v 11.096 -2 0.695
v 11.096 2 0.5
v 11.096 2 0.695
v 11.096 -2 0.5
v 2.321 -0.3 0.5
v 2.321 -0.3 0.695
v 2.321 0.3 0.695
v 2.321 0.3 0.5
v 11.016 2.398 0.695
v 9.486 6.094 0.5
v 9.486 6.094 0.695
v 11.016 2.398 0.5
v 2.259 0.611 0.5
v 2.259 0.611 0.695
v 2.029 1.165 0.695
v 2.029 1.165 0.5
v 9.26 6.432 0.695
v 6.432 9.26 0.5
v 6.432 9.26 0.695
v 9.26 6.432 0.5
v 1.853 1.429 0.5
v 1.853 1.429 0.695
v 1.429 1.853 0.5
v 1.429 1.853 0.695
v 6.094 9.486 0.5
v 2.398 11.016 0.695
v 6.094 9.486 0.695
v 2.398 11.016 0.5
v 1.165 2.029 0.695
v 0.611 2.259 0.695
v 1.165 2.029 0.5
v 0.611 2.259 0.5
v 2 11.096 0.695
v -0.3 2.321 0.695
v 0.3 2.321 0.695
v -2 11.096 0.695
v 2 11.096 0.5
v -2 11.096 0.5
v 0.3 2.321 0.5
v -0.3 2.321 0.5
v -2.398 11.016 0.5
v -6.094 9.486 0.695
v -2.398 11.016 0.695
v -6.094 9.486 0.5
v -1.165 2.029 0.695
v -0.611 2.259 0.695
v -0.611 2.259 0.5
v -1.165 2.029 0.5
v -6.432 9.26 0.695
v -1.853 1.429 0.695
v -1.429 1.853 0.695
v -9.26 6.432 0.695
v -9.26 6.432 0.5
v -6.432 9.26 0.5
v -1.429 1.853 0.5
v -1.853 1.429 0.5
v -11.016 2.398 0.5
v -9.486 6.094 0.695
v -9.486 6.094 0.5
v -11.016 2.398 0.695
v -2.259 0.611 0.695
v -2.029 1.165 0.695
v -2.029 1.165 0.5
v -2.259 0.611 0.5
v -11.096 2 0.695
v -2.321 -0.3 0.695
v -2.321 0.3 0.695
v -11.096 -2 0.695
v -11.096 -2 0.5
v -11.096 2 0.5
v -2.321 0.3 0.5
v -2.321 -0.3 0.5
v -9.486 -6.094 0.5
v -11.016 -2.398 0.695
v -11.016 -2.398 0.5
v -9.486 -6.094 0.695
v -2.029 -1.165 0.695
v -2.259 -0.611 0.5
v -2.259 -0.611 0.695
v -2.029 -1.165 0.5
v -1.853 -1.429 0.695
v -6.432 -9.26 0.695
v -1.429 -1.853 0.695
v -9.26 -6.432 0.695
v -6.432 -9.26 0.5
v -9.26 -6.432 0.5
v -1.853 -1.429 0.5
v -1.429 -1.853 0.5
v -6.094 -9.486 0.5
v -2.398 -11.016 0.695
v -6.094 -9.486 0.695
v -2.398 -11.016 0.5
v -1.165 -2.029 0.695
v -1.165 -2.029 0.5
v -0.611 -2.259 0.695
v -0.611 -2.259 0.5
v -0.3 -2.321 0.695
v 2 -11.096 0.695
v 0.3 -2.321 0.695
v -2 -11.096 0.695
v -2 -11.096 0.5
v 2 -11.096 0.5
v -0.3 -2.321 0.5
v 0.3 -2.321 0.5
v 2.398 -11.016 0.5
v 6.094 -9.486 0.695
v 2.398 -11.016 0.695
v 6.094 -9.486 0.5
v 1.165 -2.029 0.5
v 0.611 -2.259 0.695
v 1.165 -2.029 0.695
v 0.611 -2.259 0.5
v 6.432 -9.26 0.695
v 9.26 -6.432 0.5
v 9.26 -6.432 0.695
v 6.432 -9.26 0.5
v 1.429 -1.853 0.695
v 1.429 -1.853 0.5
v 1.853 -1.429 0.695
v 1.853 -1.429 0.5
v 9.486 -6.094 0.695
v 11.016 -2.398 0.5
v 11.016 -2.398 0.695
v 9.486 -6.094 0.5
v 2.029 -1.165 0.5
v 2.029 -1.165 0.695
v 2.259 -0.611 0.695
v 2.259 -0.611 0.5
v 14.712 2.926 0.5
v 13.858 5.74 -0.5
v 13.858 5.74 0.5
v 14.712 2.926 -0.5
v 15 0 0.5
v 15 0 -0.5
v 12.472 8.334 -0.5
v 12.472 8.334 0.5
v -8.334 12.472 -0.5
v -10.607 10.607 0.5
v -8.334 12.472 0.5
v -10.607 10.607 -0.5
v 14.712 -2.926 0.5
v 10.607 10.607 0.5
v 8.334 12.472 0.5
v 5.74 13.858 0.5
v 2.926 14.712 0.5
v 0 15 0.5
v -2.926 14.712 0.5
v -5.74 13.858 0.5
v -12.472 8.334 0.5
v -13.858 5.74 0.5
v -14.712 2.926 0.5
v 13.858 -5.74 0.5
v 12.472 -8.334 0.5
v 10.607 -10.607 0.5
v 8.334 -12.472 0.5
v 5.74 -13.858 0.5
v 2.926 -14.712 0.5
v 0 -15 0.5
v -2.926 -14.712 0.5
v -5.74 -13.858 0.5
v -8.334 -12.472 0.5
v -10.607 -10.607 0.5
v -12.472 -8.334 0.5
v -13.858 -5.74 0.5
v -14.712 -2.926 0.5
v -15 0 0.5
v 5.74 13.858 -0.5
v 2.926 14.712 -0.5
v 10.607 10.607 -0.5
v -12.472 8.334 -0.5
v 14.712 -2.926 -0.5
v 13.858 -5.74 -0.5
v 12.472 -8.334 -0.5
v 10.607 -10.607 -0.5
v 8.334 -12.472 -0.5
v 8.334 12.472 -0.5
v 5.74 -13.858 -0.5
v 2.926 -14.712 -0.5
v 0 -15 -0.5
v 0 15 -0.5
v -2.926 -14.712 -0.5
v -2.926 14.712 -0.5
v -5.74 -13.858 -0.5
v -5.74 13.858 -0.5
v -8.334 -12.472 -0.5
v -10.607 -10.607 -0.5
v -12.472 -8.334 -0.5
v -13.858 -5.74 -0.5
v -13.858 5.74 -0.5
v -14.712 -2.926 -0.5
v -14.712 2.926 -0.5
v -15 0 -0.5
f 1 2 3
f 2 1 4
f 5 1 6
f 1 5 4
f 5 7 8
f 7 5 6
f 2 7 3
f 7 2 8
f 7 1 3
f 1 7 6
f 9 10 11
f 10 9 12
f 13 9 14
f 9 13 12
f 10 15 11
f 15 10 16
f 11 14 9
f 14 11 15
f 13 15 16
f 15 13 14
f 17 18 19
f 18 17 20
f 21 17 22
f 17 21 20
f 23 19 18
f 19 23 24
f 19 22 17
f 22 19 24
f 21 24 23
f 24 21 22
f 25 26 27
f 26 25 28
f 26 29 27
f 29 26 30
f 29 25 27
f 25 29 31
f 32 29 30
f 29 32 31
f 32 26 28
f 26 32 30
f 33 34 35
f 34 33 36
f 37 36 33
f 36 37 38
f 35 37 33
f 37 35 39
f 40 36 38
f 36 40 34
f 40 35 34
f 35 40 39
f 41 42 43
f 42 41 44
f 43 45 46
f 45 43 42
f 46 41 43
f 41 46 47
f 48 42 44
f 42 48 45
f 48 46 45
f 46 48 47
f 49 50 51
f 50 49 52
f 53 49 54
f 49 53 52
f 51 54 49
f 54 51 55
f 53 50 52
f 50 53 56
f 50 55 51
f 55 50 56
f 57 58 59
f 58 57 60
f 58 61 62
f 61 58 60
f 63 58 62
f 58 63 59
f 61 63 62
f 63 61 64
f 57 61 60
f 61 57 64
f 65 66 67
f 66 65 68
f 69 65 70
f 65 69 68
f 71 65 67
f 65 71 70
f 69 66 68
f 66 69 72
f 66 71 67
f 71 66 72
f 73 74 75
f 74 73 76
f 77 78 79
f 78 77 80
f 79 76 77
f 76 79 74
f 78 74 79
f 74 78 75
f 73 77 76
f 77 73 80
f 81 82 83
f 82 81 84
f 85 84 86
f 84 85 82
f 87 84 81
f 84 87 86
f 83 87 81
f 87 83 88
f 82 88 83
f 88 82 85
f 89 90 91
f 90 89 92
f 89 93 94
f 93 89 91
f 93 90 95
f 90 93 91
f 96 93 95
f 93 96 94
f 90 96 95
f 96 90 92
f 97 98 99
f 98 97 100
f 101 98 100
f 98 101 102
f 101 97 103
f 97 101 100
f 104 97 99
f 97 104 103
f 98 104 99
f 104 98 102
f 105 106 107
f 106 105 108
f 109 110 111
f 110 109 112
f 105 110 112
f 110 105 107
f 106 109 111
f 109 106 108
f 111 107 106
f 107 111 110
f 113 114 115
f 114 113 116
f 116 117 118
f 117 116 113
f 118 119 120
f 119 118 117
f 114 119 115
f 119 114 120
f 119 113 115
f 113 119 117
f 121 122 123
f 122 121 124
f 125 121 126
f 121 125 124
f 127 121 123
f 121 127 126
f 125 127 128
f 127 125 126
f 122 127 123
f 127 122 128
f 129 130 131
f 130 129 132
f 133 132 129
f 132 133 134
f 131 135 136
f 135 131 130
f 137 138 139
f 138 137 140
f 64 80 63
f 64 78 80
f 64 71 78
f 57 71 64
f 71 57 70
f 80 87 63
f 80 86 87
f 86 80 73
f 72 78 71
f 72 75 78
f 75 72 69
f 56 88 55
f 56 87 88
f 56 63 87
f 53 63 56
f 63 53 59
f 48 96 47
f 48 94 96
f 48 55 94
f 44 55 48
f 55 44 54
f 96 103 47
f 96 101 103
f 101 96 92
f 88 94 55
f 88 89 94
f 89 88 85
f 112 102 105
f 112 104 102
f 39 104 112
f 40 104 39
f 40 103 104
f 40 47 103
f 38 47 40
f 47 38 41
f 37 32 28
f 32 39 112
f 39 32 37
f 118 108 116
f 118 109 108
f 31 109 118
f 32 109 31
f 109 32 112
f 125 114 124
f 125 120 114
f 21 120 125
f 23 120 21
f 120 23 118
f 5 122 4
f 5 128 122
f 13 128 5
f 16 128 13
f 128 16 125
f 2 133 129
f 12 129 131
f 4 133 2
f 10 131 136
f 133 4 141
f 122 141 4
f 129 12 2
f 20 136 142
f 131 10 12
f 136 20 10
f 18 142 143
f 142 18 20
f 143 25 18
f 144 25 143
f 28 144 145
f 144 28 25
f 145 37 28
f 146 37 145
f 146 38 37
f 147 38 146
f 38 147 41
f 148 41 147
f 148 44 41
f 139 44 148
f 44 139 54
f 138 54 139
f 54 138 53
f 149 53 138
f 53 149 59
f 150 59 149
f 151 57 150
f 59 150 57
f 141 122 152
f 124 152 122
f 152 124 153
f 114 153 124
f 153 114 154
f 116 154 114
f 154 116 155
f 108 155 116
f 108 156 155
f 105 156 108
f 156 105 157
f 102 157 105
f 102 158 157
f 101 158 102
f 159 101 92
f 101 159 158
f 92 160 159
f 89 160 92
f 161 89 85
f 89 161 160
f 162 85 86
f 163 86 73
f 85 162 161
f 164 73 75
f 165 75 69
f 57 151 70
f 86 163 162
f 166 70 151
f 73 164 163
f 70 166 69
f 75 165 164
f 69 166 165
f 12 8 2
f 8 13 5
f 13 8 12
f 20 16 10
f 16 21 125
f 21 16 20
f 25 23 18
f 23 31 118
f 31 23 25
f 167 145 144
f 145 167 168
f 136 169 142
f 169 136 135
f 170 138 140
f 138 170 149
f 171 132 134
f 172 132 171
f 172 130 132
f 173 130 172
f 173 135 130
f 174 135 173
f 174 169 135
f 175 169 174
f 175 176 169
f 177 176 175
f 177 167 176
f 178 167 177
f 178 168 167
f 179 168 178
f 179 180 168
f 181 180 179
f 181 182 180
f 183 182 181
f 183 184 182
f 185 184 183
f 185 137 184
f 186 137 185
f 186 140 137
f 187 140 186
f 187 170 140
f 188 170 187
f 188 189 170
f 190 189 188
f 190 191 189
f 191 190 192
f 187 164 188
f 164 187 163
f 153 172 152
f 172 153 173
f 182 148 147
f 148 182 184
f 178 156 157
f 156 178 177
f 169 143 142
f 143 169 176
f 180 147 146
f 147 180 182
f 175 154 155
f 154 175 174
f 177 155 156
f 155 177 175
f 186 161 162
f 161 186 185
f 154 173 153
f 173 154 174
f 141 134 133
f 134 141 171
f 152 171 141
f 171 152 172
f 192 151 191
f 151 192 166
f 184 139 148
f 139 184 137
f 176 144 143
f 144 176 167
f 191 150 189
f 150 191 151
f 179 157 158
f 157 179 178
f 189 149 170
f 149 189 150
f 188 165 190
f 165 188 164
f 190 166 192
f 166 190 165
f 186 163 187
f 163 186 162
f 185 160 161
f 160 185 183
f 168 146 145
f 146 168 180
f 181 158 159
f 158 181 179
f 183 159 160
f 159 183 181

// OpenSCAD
$fn=32;
number_of_ribs= 16.000000;
plate_radius= 15.000000;
plate_thickness= 1.000000;
min_rib_width= 0.600000;
max_rib_width= 4.000000;
rib_radius= 6.708204;
rib_thickness= 0.200000;
rib_length= 8.775000;

module pbase() { 
	 polygon(points=[[-rib_length/2.0,min_rib_width/2.0],[rib_length/2,max_rib_width/2.0],[rib_length/2.0,-max_rib_width/2.0],[-rib_length/2.0,-min_rib_width/2.0]],paths=[[0,1,2,3]]); 
 }


module trapezoidal_rib() { 
	  linear_extrude(height=rib_thickness,center=true) { 
		 pbase(); 	 
 } 
 }
module trapezoidal_ribs() { 
 	 for (i = [0:number_of_ribs-1] ) { 
 		 angle = i*360.0/number_of_ribs; 
 		 rotate([0,0,angle]) { 
 			  translate([rib_radius,0,rib_thickness/2.0-0.005+plate_thickness/2.0]) trapezoidal_rib(); 
 		 } 
 	 } 
 } 
 

union() { 
 	 trapezoidal_ribs(); 
 	 cylinder(height=plate_thickness,r=plate_radius,center=true); 
 }
